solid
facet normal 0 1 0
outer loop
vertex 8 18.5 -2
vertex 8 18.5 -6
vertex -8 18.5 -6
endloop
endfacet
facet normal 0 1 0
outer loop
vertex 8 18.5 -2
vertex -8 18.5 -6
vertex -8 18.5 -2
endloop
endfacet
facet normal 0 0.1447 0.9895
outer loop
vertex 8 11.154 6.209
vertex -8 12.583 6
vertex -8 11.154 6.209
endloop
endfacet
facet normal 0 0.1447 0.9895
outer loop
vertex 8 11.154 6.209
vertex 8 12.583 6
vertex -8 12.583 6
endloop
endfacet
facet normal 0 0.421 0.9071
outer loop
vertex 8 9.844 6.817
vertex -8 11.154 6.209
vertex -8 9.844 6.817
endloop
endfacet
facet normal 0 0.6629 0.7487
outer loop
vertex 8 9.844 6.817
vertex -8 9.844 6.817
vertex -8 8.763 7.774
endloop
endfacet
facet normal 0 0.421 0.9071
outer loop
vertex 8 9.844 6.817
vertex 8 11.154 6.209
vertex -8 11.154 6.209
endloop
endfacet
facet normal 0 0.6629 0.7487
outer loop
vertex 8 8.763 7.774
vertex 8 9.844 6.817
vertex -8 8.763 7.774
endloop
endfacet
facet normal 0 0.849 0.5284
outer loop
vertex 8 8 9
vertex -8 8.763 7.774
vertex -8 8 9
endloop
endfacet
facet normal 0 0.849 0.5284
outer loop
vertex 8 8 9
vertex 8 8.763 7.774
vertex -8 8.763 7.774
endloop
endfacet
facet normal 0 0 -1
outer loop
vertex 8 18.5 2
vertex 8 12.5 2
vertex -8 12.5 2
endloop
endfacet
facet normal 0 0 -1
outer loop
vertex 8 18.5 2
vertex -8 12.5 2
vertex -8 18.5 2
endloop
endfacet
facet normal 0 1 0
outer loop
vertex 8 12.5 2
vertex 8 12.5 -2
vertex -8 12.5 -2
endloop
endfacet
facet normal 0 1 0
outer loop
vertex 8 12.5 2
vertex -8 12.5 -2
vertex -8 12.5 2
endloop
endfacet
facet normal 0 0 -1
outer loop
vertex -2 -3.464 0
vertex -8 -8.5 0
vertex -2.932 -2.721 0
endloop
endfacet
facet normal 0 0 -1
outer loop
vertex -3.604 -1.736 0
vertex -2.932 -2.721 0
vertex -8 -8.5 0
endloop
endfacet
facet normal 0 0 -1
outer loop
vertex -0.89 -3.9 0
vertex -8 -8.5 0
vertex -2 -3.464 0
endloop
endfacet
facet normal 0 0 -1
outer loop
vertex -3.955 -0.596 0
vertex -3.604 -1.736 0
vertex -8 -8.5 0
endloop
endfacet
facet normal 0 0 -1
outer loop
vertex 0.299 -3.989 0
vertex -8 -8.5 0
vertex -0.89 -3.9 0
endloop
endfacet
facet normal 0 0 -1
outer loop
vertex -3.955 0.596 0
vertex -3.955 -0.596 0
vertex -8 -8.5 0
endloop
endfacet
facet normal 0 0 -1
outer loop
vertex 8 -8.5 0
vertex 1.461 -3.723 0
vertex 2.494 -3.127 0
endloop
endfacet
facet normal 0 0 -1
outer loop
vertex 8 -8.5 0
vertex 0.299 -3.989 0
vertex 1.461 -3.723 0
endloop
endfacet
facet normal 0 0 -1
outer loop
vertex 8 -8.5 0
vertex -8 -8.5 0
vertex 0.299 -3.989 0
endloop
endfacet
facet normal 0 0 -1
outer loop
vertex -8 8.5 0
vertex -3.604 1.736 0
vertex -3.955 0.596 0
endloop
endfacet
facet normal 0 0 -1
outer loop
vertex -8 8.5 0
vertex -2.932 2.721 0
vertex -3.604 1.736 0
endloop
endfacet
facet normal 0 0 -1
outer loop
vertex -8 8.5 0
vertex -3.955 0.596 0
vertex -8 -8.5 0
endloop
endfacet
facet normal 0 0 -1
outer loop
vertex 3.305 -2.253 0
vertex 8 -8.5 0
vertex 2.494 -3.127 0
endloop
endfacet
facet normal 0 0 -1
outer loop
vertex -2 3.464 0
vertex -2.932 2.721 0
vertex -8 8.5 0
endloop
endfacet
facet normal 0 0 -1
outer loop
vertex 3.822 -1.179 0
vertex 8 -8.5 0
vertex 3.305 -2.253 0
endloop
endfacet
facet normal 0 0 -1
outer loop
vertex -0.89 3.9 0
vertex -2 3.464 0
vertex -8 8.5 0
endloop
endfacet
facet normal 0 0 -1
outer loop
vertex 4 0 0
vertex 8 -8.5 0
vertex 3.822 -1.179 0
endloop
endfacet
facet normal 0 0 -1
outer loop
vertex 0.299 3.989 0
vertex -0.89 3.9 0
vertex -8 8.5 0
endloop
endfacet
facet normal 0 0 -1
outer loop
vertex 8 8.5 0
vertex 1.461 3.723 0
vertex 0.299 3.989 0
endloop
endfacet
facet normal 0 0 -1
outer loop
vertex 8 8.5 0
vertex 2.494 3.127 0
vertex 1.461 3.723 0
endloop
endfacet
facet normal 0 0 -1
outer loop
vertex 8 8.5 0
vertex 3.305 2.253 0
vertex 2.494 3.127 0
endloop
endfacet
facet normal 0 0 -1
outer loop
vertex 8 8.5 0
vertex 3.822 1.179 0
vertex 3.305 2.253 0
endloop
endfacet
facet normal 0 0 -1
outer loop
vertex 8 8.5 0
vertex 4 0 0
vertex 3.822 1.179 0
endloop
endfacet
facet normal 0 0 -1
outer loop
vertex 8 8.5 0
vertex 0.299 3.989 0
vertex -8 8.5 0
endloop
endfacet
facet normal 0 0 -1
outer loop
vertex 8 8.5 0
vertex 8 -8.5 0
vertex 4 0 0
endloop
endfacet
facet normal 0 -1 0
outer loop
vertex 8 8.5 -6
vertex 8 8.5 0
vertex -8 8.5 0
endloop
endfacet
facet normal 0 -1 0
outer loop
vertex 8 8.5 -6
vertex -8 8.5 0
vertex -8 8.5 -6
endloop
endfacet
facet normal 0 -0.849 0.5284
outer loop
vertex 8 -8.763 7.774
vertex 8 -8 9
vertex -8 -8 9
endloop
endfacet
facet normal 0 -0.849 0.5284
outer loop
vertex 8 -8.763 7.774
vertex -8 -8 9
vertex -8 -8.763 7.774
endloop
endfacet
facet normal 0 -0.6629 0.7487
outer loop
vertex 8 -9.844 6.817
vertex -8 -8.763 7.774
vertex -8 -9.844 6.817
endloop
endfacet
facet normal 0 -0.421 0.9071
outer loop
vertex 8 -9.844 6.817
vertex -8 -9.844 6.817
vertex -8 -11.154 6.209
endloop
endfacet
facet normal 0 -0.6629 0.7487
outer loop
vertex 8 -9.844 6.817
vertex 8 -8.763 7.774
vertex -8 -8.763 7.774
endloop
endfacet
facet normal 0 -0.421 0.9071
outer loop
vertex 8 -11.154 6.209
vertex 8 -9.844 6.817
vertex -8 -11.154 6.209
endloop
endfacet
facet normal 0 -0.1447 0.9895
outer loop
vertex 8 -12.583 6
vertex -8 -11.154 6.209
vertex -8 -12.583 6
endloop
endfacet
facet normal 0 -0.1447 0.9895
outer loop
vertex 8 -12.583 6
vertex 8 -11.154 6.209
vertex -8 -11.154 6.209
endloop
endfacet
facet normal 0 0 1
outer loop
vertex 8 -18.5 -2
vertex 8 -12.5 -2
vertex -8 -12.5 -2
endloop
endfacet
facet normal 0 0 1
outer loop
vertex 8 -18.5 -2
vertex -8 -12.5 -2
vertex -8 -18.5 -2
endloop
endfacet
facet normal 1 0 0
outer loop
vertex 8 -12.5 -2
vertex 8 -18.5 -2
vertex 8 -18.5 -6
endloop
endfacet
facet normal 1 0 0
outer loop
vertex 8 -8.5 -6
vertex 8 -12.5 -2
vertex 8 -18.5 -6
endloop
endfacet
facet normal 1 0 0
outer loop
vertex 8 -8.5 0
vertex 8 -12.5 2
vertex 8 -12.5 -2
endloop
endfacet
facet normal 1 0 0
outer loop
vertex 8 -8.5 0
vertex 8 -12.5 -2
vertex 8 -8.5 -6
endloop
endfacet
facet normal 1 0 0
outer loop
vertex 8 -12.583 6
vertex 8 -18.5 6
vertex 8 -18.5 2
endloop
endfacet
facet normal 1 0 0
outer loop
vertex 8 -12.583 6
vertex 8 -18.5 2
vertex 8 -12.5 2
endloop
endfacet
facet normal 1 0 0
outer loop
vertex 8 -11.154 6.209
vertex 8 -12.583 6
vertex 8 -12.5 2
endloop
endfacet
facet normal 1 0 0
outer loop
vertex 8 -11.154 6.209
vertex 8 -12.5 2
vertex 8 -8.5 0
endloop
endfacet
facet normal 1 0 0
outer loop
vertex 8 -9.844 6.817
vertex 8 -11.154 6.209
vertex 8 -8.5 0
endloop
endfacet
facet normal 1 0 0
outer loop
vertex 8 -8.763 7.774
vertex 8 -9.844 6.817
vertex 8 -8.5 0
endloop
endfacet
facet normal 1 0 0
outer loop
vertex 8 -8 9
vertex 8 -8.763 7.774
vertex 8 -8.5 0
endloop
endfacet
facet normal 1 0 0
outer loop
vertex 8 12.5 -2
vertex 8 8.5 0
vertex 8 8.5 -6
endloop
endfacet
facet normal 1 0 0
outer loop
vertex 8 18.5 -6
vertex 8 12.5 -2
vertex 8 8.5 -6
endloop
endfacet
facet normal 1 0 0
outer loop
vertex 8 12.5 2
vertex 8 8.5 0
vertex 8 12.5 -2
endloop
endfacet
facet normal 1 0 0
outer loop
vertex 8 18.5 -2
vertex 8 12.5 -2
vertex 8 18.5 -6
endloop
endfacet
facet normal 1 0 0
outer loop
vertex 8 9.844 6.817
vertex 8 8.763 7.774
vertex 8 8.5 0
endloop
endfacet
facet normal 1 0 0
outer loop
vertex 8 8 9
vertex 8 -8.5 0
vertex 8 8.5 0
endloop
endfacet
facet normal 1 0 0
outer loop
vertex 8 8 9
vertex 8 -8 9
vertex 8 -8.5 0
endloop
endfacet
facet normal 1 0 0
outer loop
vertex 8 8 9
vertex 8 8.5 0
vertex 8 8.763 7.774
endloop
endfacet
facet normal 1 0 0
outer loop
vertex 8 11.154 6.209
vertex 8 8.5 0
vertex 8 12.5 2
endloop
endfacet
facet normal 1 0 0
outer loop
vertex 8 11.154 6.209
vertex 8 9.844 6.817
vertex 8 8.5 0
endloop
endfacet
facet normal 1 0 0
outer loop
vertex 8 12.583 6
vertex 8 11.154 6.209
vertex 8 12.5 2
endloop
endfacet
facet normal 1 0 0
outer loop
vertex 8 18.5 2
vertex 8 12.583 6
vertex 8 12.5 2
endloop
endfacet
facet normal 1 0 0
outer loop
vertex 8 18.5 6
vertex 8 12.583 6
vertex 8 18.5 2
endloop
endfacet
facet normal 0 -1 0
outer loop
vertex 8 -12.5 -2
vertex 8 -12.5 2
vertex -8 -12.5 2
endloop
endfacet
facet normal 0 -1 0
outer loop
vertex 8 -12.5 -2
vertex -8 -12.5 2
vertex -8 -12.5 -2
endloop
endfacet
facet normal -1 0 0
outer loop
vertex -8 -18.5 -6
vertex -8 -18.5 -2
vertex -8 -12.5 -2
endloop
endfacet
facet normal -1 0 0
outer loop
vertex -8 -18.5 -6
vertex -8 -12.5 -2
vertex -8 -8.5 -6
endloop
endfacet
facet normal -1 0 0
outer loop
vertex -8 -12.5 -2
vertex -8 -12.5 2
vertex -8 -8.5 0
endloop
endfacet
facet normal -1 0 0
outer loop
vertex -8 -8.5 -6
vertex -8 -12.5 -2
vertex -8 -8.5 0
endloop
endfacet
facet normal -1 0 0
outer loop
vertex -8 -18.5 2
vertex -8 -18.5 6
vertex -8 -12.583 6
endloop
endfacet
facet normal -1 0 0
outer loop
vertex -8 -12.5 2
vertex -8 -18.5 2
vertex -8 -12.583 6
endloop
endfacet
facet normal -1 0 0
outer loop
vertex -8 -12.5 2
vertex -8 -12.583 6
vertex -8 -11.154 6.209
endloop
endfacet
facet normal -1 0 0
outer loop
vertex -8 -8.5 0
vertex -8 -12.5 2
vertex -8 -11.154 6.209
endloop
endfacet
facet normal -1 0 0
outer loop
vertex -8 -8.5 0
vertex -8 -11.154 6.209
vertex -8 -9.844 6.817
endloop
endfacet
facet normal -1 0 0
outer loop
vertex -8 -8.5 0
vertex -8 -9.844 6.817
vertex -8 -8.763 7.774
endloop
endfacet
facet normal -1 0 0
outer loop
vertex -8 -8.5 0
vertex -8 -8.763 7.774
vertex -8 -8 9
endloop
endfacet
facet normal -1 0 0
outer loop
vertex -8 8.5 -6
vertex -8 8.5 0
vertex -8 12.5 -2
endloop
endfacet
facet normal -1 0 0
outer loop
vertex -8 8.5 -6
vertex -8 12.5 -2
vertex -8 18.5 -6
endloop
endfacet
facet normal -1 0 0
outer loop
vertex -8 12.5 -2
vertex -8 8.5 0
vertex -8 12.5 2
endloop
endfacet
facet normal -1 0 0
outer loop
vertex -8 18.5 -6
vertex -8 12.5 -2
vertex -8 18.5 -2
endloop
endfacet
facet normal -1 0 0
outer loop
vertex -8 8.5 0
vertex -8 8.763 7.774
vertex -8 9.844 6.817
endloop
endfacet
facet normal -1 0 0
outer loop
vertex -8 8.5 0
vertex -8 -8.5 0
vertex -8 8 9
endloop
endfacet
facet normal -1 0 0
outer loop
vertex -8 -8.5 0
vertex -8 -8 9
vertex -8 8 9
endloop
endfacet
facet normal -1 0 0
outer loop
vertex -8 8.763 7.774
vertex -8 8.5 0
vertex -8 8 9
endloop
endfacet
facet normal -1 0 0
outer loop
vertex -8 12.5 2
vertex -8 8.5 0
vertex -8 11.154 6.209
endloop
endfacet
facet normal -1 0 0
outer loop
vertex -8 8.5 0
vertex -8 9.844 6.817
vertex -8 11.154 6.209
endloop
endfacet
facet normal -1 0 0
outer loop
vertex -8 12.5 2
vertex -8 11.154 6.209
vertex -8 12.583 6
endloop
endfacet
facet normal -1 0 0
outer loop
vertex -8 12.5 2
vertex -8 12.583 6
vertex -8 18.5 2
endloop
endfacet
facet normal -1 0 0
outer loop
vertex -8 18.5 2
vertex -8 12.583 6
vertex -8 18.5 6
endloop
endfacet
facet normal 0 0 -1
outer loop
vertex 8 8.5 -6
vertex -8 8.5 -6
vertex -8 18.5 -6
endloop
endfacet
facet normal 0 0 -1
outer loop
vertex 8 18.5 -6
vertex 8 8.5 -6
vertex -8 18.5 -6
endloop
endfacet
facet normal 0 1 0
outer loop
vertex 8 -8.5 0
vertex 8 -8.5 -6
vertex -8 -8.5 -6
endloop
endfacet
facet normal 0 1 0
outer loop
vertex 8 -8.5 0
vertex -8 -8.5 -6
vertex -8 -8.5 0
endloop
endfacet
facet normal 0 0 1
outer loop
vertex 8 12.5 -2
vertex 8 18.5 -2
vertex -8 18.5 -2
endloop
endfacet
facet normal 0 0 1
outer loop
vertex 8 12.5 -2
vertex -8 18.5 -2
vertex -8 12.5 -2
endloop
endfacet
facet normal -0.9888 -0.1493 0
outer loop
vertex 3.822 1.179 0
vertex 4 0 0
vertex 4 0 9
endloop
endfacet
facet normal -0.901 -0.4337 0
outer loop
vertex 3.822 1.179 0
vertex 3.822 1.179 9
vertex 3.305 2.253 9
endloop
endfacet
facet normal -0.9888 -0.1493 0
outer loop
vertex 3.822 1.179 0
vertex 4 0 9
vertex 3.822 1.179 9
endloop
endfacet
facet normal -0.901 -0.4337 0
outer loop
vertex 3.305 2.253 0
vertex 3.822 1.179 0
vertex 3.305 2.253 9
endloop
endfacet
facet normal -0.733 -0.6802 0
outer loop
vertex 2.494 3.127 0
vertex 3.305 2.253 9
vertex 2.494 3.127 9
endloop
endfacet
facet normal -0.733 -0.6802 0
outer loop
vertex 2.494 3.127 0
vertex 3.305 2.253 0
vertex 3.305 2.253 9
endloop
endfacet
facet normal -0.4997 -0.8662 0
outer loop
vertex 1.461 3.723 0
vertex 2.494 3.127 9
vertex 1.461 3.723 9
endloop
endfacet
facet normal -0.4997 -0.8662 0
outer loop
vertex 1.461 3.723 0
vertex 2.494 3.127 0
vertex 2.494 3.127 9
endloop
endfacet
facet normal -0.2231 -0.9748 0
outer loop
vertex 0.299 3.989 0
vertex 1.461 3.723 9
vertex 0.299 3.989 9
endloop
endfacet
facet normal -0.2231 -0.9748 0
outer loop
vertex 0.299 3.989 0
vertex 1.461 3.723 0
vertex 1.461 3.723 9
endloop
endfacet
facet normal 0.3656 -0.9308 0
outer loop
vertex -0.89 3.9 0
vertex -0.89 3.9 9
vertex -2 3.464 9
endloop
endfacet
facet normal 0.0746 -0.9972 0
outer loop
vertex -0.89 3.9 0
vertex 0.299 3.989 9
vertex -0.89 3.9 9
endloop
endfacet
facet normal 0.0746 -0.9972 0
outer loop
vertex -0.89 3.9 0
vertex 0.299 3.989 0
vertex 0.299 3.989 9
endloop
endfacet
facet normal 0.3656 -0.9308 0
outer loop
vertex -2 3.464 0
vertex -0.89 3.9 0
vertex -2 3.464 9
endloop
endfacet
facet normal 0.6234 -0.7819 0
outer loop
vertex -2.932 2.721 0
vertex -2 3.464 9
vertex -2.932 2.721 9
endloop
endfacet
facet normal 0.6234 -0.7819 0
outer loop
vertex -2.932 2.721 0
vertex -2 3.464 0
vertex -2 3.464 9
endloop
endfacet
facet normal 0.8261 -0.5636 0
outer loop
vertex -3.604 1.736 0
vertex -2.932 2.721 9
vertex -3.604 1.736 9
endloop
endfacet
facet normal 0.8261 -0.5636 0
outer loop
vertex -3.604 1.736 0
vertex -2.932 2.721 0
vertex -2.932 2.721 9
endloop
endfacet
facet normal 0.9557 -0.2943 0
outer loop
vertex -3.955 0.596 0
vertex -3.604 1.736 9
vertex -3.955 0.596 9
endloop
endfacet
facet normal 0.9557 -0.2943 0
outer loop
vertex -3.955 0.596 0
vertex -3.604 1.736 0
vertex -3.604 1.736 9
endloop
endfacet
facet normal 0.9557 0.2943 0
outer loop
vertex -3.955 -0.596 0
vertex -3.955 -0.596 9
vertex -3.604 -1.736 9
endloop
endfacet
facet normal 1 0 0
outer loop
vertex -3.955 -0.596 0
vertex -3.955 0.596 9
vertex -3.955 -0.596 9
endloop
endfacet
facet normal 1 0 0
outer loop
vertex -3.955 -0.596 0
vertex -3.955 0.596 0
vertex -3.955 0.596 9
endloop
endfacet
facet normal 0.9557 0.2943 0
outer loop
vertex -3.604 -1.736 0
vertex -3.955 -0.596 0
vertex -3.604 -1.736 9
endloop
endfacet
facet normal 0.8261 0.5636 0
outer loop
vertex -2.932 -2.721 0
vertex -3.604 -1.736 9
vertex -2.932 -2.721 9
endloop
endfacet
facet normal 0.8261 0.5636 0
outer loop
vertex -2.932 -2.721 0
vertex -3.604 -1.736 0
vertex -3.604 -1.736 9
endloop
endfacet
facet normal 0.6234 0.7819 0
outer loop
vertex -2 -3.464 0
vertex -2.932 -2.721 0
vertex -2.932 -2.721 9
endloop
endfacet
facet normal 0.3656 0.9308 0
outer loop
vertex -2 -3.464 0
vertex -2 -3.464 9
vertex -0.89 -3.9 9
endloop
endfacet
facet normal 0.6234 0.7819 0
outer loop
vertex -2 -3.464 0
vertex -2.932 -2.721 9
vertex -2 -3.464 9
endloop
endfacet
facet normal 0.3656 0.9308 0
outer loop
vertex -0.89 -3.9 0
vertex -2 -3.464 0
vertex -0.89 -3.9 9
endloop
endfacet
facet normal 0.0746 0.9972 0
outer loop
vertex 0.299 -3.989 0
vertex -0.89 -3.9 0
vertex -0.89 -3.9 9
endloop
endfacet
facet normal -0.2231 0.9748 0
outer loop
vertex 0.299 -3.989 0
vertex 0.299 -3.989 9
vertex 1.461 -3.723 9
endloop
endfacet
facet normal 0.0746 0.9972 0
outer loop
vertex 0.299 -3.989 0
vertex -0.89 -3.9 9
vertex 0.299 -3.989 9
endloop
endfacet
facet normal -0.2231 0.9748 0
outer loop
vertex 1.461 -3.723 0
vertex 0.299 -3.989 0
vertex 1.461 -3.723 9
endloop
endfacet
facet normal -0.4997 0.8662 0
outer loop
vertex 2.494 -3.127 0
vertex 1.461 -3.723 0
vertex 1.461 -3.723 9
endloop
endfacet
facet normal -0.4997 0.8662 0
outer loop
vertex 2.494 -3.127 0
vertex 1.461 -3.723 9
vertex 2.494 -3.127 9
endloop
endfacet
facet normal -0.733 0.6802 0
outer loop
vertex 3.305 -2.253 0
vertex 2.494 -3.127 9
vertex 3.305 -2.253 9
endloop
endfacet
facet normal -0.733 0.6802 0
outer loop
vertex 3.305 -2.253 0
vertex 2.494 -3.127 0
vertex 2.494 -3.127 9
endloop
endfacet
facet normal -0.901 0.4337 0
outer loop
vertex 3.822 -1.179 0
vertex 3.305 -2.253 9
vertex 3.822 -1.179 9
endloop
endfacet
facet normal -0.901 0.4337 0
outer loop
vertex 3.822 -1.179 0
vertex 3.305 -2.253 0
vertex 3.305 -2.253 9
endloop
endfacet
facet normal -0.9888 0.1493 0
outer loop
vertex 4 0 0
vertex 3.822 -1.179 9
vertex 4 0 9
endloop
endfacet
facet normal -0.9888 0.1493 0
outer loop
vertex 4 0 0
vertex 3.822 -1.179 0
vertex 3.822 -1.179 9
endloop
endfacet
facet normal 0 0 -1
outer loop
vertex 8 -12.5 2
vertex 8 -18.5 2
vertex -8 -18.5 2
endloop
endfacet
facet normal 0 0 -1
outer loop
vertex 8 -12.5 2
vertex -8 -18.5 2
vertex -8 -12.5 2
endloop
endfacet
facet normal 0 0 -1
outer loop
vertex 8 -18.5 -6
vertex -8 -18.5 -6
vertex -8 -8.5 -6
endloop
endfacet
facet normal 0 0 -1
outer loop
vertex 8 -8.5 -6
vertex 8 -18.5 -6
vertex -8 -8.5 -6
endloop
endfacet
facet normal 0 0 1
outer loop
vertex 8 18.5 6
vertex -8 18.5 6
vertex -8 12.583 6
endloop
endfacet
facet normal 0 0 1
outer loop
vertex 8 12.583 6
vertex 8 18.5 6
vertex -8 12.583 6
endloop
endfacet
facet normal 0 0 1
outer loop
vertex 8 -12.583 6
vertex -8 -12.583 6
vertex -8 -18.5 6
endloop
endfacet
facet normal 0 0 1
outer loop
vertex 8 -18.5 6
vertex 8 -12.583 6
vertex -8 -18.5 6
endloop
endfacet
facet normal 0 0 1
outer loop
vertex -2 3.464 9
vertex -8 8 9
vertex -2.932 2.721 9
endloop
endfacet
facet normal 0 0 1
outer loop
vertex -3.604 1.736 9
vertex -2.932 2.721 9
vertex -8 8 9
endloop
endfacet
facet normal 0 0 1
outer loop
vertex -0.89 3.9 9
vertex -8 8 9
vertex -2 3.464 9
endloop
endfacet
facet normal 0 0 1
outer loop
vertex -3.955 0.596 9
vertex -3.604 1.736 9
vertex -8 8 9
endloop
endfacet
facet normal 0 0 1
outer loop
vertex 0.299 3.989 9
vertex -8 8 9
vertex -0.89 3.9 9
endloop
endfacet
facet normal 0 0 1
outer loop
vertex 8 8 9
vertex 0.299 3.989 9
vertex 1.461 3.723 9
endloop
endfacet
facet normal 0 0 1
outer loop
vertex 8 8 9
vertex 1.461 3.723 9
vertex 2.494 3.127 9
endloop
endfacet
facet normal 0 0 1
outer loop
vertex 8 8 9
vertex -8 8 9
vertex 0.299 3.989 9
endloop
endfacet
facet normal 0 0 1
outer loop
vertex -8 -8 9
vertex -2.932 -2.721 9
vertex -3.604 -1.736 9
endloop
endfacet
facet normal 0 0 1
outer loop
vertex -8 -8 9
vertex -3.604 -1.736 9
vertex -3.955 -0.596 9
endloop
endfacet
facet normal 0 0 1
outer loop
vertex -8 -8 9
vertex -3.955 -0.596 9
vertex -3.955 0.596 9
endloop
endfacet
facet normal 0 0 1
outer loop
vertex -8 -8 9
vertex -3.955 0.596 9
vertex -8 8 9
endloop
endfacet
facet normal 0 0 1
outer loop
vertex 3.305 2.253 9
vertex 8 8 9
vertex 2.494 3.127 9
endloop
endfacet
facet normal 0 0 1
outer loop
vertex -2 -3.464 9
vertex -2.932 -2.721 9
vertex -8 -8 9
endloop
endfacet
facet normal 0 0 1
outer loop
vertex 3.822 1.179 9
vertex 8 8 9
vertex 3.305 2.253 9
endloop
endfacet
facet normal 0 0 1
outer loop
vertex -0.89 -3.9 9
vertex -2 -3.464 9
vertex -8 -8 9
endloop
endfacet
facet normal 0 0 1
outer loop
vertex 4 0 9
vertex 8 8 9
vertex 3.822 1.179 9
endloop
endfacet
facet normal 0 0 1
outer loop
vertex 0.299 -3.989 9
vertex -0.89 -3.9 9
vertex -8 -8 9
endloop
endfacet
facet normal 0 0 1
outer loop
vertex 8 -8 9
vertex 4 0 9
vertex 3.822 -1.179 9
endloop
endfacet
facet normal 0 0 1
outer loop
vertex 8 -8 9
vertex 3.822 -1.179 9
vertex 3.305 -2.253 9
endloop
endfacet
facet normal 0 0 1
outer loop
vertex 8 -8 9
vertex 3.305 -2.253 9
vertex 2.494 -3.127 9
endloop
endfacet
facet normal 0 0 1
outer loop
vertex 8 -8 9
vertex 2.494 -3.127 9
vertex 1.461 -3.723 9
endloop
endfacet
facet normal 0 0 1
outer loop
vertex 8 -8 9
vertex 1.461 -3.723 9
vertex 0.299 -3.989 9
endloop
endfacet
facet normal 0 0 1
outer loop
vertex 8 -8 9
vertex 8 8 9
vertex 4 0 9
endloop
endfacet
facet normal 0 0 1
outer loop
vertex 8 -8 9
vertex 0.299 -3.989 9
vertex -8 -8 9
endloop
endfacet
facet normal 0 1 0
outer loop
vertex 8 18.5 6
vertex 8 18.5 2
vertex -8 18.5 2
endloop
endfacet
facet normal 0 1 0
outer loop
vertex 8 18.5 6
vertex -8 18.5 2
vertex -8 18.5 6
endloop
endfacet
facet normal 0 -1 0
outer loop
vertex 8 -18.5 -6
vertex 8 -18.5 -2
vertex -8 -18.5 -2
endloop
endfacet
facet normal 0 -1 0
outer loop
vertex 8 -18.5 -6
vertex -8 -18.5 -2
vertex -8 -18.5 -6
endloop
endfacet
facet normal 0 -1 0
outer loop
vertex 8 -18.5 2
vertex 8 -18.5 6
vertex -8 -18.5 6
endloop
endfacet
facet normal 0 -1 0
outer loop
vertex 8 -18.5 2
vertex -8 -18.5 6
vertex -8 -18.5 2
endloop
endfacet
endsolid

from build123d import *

# Parameters (mm, degrees)
BOSS_EXTRUDE1_DEPTH     = 8
CUT_EXTRUDE1_DEPTH      = 26.124689053
CUT_EXTRUDE1_DEPTH_BACK = 26.124689053
SKETCH2_R               = 4


with BuildPart() as part:
    # Sketch1 → Boss-Extrude1 (new, symmetric)
    with BuildSketch(Plane.YZ):
        with BuildLine():
            Line((8, 9), (-8, 9))
            ThreePointArc((-8, 9), (-9.843962907, 6.816699867), (-12.582575695, 6))
            Line((-12.582575695, 6), (-18.5, 6))
            Line((-18.5, 6), (-18.5, 2))
            Line((-18.5, 2), (-12.5, 2))
            Line((-12.5, 2), (-12.5, -2))
            Line((-12.5, -2), (-18.5, -2))
            Line((-18.5, -2), (-18.5, -6))
            Line((-18.5, -6), (-8.5, -6))
            Line((-8.5, -6), (-8.5, 0))
            Line((-8.5, 0), (8.5, 0))
            Line((8.5, 0), (8.5, -6))
            Line((8.5, -6), (18.5, -6))
            Line((18.5, -6), (18.5, -2))
            Line((18.5, -2), (12.5, -2))
            Line((12.5, -2), (12.5, 2))
            Line((12.5, 2), (18.5, 2))
            Line((18.5, 2), (18.5, 6))
            Line((18.5, 6), (12.582575695, 6))
            ThreePointArc((12.582575695, 6), (9.843962907, 6.816699867), (8, 9))
        make_face()
    extrude(amount=BOSS_EXTRUDE1_DEPTH, both=True)

    # Sketch2 → Cut-Extrude1 (cut, two sides: drawn at the far end of the back side and taken through both)
    with BuildSketch(Plane.XY.offset(9).offset(-CUT_EXTRUDE1_DEPTH_BACK)):
        Circle(SKETCH2_R)
    extrude(amount=CUT_EXTRUDE1_DEPTH + CUT_EXTRUDE1_DEPTH_BACK, mode=Mode.SUBTRACT)


solid = part.part
